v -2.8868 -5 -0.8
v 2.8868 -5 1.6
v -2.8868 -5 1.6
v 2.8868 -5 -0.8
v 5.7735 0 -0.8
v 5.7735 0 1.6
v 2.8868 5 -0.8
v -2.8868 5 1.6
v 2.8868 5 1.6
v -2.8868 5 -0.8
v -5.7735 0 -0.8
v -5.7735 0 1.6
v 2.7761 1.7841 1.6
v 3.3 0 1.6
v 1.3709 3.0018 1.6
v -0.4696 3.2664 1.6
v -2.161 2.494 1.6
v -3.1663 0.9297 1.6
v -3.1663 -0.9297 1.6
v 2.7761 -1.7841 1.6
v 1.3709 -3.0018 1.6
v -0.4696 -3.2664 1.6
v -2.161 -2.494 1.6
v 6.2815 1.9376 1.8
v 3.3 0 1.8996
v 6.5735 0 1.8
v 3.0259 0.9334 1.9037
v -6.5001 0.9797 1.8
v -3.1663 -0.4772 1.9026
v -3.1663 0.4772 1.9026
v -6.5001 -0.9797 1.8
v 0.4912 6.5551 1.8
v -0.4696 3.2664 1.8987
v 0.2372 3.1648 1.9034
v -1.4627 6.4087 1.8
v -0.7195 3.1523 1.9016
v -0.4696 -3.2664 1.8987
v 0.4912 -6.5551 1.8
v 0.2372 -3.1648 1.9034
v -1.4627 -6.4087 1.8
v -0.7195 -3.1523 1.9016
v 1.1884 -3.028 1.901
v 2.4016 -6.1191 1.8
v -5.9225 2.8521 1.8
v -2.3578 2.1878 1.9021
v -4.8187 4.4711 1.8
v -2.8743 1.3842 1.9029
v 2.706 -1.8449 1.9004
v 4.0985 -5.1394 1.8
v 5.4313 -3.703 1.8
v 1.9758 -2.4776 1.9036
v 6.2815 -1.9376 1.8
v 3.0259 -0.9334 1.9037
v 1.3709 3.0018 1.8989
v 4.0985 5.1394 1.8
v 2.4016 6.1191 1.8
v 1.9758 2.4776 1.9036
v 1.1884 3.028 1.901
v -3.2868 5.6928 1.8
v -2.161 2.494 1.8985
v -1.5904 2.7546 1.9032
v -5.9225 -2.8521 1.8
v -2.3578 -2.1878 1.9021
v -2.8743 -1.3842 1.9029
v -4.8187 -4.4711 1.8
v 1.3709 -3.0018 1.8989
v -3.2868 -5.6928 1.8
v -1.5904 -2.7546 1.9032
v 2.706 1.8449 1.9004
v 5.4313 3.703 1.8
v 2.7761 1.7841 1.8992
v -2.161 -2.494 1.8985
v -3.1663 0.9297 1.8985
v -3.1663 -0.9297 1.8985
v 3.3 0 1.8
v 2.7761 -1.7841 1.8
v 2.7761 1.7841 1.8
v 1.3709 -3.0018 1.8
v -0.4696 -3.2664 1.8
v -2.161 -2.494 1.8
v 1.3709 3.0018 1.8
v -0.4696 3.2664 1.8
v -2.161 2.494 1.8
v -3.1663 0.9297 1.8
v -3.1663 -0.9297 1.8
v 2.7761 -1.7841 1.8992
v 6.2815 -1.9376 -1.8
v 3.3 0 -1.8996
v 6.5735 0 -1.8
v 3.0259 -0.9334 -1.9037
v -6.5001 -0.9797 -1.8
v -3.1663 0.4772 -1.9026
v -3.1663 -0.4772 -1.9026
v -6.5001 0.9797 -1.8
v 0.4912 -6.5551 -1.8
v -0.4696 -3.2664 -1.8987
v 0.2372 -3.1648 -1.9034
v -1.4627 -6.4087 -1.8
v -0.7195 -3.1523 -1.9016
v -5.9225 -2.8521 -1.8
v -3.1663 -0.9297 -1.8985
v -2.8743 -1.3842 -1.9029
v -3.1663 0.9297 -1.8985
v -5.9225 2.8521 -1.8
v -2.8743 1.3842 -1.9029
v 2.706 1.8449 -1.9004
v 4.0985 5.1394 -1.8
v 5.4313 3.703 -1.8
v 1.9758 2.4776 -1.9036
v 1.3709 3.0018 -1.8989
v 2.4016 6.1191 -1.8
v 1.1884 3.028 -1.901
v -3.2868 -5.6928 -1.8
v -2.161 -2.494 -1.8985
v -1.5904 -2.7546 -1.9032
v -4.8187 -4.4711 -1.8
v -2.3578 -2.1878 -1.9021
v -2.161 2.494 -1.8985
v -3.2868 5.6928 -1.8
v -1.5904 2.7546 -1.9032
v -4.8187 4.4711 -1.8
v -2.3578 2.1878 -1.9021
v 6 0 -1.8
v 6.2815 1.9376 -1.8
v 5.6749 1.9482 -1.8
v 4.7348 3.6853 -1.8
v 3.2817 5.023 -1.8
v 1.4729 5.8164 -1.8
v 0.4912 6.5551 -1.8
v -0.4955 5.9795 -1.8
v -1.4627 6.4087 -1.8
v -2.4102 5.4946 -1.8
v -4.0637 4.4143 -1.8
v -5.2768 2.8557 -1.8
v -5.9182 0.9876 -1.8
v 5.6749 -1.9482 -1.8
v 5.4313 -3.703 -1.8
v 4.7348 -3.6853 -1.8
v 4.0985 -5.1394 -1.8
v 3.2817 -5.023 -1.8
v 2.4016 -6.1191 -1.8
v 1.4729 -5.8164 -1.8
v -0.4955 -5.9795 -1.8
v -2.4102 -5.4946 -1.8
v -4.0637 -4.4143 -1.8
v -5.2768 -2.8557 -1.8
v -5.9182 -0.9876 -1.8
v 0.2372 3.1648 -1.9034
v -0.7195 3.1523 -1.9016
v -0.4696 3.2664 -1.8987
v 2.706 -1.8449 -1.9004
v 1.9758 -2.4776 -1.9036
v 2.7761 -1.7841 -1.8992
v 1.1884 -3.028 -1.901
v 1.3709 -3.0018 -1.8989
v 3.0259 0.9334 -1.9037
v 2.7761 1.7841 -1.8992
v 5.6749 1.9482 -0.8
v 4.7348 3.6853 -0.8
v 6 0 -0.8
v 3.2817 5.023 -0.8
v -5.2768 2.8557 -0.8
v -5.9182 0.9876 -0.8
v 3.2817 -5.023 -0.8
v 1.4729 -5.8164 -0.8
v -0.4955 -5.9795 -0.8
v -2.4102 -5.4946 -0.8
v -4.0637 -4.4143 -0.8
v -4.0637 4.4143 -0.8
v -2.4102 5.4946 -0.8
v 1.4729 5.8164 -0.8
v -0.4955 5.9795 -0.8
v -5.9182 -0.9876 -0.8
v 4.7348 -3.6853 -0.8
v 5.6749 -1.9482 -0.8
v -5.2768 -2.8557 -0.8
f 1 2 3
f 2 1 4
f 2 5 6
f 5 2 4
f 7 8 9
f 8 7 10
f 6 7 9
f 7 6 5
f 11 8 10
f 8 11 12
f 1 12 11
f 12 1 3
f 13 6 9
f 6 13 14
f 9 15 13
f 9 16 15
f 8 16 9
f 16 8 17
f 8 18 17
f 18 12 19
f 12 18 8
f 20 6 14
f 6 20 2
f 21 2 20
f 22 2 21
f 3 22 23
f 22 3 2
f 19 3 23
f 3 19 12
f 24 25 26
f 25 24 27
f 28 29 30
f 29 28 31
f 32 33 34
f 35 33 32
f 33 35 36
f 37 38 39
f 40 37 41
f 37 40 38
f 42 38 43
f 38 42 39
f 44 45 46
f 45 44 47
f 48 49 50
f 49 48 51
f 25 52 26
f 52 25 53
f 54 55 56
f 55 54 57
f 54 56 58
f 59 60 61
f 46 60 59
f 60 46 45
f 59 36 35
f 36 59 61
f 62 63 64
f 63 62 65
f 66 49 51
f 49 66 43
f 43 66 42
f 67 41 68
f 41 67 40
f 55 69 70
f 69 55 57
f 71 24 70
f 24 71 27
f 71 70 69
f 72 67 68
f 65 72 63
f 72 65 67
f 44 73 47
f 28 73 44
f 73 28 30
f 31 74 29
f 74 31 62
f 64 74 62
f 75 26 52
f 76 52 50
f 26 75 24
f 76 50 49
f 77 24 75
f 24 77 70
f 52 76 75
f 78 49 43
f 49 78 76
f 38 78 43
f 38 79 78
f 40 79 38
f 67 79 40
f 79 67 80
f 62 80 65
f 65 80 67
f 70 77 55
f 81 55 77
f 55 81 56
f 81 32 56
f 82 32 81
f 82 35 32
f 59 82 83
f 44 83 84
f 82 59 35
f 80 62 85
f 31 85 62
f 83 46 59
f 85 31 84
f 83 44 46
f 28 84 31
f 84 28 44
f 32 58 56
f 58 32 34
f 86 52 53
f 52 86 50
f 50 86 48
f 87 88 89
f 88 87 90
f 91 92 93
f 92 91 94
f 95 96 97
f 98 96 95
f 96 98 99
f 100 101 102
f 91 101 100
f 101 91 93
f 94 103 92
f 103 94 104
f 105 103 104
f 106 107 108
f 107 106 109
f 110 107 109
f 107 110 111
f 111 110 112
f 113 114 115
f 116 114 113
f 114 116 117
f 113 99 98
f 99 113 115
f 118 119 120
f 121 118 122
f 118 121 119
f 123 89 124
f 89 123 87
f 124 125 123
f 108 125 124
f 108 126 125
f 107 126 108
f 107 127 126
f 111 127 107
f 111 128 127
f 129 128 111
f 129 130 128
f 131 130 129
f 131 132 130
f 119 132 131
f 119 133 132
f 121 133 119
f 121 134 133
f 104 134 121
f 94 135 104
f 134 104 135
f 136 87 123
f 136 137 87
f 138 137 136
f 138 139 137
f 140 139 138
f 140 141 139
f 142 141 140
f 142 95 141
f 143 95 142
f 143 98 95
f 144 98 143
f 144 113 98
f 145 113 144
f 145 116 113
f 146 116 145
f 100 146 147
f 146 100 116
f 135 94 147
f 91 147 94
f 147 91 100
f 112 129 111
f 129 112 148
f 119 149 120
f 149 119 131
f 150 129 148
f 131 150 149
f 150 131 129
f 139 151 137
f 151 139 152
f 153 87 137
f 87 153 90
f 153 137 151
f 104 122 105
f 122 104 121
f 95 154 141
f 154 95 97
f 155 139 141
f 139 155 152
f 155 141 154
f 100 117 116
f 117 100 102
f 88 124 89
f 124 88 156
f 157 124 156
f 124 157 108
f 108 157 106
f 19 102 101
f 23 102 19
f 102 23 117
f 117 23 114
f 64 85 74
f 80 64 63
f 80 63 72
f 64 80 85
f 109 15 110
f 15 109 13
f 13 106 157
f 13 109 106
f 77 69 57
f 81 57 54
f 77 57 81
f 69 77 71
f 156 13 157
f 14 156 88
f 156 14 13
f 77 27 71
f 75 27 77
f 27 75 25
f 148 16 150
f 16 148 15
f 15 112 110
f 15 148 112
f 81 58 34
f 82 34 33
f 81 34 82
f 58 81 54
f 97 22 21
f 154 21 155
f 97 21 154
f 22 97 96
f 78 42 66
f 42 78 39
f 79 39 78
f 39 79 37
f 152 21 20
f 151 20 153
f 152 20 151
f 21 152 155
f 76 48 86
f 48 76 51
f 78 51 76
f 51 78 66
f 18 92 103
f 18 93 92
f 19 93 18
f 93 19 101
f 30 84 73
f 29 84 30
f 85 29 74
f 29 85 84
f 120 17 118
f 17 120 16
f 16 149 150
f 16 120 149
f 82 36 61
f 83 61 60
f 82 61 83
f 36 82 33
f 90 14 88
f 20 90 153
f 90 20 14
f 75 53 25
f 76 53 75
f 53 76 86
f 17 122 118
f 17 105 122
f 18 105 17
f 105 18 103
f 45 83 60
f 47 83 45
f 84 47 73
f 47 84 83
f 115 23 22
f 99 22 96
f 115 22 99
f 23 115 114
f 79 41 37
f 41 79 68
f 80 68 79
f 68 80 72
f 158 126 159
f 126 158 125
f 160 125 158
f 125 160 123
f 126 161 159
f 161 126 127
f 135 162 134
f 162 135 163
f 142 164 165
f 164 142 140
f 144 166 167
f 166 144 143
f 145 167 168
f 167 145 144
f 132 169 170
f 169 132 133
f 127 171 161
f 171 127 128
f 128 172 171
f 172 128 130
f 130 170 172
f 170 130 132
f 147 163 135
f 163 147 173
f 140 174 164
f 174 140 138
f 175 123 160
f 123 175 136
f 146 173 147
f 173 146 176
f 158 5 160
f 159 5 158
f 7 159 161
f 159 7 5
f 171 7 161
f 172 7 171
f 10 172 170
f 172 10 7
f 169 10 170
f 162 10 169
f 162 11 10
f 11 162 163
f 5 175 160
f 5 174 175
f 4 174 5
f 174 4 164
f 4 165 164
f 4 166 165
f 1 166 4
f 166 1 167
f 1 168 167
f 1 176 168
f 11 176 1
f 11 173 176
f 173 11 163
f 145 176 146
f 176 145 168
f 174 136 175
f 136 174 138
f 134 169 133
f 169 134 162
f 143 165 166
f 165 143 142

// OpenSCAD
// Parameters
thread_diameter = 6.0; //[3.0:12.0:0.1]
across_flats = 10.0; //[6.0:20.0:0.1]
thickness = 3.2; //[1.6:6.4:0.1]
hole_type = 0; //[0:1:1]
thread_pitch = 1.0; //[0.5:2.0:0.05]
edge_chamfer = 0.2; //[0.0:0.8:0.05]
corner_radius = 0.0; //[0.0:1.0:0.05]
clearance_diameter = 6.6; //[6.1:7.2:0.05]
tap_drill_diameter = 5.0; //[4.2:5.5:0.05]
hole_extra_height = 2.0; //[0.5:6.0:0.5]
overlap = 0.8; //[0.5:2.0:0.1]
washer_outer_diameter = 12.0; //[8.0:24.0:0.1]
washer_thickness = 1.0; //[0.5:3.0:0.1]

// Hexagonal Nut with Chamfer
module hex_nut() {
  color("DimGray") {
    difference() {
      union() {
        // Hexagonal body
        cylinder(h=thickness, r=across_flats/(2*cos(30)), center=true, $fn=6);
        // Chamfer top and bottom
        translate([0, 0, thickness/2 - edge_chamfer/2 + overlap/2])
          cylinder(h=edge_chamfer, r1=across_flats/(2*cos(30)) + overlap, r2=0, center=true);
        translate([0, 0, -thickness/2 + edge_chamfer/2 - overlap/2])
          rotate([180, 0, 0])
          cylinder(h=edge_chamfer, r1=across_flats/(2*cos(30)) + overlap, r2=0, center=true);
      }
      // Central hole
      cylinder(h=thickness + hole_extra_height, r=((1-hole_type)*clearance_diameter + hole_type*tap_drill_diameter)/2, center=true);
    }
  }
}

// Washer
module washer() {
  color("Silver") {
    difference() {
      // Outer washer
      cylinder(h=washer_thickness, r=washer_outer_diameter/2, center=true);
      // Washer hole
      cylinder(h=washer_thickness + hole_extra_height, r=clearance_diameter/2, center=true);
    }
  }
}

// Nut and Washer Assembly
module nut_and_washer() {
  hex_nut();
  translate([0, 0, -thickness/2 - washer_thickness/2 + overlap])
    washer();
}

// Final Assembly
module assembly() {
  nut_and_washer();
}

assembly();
